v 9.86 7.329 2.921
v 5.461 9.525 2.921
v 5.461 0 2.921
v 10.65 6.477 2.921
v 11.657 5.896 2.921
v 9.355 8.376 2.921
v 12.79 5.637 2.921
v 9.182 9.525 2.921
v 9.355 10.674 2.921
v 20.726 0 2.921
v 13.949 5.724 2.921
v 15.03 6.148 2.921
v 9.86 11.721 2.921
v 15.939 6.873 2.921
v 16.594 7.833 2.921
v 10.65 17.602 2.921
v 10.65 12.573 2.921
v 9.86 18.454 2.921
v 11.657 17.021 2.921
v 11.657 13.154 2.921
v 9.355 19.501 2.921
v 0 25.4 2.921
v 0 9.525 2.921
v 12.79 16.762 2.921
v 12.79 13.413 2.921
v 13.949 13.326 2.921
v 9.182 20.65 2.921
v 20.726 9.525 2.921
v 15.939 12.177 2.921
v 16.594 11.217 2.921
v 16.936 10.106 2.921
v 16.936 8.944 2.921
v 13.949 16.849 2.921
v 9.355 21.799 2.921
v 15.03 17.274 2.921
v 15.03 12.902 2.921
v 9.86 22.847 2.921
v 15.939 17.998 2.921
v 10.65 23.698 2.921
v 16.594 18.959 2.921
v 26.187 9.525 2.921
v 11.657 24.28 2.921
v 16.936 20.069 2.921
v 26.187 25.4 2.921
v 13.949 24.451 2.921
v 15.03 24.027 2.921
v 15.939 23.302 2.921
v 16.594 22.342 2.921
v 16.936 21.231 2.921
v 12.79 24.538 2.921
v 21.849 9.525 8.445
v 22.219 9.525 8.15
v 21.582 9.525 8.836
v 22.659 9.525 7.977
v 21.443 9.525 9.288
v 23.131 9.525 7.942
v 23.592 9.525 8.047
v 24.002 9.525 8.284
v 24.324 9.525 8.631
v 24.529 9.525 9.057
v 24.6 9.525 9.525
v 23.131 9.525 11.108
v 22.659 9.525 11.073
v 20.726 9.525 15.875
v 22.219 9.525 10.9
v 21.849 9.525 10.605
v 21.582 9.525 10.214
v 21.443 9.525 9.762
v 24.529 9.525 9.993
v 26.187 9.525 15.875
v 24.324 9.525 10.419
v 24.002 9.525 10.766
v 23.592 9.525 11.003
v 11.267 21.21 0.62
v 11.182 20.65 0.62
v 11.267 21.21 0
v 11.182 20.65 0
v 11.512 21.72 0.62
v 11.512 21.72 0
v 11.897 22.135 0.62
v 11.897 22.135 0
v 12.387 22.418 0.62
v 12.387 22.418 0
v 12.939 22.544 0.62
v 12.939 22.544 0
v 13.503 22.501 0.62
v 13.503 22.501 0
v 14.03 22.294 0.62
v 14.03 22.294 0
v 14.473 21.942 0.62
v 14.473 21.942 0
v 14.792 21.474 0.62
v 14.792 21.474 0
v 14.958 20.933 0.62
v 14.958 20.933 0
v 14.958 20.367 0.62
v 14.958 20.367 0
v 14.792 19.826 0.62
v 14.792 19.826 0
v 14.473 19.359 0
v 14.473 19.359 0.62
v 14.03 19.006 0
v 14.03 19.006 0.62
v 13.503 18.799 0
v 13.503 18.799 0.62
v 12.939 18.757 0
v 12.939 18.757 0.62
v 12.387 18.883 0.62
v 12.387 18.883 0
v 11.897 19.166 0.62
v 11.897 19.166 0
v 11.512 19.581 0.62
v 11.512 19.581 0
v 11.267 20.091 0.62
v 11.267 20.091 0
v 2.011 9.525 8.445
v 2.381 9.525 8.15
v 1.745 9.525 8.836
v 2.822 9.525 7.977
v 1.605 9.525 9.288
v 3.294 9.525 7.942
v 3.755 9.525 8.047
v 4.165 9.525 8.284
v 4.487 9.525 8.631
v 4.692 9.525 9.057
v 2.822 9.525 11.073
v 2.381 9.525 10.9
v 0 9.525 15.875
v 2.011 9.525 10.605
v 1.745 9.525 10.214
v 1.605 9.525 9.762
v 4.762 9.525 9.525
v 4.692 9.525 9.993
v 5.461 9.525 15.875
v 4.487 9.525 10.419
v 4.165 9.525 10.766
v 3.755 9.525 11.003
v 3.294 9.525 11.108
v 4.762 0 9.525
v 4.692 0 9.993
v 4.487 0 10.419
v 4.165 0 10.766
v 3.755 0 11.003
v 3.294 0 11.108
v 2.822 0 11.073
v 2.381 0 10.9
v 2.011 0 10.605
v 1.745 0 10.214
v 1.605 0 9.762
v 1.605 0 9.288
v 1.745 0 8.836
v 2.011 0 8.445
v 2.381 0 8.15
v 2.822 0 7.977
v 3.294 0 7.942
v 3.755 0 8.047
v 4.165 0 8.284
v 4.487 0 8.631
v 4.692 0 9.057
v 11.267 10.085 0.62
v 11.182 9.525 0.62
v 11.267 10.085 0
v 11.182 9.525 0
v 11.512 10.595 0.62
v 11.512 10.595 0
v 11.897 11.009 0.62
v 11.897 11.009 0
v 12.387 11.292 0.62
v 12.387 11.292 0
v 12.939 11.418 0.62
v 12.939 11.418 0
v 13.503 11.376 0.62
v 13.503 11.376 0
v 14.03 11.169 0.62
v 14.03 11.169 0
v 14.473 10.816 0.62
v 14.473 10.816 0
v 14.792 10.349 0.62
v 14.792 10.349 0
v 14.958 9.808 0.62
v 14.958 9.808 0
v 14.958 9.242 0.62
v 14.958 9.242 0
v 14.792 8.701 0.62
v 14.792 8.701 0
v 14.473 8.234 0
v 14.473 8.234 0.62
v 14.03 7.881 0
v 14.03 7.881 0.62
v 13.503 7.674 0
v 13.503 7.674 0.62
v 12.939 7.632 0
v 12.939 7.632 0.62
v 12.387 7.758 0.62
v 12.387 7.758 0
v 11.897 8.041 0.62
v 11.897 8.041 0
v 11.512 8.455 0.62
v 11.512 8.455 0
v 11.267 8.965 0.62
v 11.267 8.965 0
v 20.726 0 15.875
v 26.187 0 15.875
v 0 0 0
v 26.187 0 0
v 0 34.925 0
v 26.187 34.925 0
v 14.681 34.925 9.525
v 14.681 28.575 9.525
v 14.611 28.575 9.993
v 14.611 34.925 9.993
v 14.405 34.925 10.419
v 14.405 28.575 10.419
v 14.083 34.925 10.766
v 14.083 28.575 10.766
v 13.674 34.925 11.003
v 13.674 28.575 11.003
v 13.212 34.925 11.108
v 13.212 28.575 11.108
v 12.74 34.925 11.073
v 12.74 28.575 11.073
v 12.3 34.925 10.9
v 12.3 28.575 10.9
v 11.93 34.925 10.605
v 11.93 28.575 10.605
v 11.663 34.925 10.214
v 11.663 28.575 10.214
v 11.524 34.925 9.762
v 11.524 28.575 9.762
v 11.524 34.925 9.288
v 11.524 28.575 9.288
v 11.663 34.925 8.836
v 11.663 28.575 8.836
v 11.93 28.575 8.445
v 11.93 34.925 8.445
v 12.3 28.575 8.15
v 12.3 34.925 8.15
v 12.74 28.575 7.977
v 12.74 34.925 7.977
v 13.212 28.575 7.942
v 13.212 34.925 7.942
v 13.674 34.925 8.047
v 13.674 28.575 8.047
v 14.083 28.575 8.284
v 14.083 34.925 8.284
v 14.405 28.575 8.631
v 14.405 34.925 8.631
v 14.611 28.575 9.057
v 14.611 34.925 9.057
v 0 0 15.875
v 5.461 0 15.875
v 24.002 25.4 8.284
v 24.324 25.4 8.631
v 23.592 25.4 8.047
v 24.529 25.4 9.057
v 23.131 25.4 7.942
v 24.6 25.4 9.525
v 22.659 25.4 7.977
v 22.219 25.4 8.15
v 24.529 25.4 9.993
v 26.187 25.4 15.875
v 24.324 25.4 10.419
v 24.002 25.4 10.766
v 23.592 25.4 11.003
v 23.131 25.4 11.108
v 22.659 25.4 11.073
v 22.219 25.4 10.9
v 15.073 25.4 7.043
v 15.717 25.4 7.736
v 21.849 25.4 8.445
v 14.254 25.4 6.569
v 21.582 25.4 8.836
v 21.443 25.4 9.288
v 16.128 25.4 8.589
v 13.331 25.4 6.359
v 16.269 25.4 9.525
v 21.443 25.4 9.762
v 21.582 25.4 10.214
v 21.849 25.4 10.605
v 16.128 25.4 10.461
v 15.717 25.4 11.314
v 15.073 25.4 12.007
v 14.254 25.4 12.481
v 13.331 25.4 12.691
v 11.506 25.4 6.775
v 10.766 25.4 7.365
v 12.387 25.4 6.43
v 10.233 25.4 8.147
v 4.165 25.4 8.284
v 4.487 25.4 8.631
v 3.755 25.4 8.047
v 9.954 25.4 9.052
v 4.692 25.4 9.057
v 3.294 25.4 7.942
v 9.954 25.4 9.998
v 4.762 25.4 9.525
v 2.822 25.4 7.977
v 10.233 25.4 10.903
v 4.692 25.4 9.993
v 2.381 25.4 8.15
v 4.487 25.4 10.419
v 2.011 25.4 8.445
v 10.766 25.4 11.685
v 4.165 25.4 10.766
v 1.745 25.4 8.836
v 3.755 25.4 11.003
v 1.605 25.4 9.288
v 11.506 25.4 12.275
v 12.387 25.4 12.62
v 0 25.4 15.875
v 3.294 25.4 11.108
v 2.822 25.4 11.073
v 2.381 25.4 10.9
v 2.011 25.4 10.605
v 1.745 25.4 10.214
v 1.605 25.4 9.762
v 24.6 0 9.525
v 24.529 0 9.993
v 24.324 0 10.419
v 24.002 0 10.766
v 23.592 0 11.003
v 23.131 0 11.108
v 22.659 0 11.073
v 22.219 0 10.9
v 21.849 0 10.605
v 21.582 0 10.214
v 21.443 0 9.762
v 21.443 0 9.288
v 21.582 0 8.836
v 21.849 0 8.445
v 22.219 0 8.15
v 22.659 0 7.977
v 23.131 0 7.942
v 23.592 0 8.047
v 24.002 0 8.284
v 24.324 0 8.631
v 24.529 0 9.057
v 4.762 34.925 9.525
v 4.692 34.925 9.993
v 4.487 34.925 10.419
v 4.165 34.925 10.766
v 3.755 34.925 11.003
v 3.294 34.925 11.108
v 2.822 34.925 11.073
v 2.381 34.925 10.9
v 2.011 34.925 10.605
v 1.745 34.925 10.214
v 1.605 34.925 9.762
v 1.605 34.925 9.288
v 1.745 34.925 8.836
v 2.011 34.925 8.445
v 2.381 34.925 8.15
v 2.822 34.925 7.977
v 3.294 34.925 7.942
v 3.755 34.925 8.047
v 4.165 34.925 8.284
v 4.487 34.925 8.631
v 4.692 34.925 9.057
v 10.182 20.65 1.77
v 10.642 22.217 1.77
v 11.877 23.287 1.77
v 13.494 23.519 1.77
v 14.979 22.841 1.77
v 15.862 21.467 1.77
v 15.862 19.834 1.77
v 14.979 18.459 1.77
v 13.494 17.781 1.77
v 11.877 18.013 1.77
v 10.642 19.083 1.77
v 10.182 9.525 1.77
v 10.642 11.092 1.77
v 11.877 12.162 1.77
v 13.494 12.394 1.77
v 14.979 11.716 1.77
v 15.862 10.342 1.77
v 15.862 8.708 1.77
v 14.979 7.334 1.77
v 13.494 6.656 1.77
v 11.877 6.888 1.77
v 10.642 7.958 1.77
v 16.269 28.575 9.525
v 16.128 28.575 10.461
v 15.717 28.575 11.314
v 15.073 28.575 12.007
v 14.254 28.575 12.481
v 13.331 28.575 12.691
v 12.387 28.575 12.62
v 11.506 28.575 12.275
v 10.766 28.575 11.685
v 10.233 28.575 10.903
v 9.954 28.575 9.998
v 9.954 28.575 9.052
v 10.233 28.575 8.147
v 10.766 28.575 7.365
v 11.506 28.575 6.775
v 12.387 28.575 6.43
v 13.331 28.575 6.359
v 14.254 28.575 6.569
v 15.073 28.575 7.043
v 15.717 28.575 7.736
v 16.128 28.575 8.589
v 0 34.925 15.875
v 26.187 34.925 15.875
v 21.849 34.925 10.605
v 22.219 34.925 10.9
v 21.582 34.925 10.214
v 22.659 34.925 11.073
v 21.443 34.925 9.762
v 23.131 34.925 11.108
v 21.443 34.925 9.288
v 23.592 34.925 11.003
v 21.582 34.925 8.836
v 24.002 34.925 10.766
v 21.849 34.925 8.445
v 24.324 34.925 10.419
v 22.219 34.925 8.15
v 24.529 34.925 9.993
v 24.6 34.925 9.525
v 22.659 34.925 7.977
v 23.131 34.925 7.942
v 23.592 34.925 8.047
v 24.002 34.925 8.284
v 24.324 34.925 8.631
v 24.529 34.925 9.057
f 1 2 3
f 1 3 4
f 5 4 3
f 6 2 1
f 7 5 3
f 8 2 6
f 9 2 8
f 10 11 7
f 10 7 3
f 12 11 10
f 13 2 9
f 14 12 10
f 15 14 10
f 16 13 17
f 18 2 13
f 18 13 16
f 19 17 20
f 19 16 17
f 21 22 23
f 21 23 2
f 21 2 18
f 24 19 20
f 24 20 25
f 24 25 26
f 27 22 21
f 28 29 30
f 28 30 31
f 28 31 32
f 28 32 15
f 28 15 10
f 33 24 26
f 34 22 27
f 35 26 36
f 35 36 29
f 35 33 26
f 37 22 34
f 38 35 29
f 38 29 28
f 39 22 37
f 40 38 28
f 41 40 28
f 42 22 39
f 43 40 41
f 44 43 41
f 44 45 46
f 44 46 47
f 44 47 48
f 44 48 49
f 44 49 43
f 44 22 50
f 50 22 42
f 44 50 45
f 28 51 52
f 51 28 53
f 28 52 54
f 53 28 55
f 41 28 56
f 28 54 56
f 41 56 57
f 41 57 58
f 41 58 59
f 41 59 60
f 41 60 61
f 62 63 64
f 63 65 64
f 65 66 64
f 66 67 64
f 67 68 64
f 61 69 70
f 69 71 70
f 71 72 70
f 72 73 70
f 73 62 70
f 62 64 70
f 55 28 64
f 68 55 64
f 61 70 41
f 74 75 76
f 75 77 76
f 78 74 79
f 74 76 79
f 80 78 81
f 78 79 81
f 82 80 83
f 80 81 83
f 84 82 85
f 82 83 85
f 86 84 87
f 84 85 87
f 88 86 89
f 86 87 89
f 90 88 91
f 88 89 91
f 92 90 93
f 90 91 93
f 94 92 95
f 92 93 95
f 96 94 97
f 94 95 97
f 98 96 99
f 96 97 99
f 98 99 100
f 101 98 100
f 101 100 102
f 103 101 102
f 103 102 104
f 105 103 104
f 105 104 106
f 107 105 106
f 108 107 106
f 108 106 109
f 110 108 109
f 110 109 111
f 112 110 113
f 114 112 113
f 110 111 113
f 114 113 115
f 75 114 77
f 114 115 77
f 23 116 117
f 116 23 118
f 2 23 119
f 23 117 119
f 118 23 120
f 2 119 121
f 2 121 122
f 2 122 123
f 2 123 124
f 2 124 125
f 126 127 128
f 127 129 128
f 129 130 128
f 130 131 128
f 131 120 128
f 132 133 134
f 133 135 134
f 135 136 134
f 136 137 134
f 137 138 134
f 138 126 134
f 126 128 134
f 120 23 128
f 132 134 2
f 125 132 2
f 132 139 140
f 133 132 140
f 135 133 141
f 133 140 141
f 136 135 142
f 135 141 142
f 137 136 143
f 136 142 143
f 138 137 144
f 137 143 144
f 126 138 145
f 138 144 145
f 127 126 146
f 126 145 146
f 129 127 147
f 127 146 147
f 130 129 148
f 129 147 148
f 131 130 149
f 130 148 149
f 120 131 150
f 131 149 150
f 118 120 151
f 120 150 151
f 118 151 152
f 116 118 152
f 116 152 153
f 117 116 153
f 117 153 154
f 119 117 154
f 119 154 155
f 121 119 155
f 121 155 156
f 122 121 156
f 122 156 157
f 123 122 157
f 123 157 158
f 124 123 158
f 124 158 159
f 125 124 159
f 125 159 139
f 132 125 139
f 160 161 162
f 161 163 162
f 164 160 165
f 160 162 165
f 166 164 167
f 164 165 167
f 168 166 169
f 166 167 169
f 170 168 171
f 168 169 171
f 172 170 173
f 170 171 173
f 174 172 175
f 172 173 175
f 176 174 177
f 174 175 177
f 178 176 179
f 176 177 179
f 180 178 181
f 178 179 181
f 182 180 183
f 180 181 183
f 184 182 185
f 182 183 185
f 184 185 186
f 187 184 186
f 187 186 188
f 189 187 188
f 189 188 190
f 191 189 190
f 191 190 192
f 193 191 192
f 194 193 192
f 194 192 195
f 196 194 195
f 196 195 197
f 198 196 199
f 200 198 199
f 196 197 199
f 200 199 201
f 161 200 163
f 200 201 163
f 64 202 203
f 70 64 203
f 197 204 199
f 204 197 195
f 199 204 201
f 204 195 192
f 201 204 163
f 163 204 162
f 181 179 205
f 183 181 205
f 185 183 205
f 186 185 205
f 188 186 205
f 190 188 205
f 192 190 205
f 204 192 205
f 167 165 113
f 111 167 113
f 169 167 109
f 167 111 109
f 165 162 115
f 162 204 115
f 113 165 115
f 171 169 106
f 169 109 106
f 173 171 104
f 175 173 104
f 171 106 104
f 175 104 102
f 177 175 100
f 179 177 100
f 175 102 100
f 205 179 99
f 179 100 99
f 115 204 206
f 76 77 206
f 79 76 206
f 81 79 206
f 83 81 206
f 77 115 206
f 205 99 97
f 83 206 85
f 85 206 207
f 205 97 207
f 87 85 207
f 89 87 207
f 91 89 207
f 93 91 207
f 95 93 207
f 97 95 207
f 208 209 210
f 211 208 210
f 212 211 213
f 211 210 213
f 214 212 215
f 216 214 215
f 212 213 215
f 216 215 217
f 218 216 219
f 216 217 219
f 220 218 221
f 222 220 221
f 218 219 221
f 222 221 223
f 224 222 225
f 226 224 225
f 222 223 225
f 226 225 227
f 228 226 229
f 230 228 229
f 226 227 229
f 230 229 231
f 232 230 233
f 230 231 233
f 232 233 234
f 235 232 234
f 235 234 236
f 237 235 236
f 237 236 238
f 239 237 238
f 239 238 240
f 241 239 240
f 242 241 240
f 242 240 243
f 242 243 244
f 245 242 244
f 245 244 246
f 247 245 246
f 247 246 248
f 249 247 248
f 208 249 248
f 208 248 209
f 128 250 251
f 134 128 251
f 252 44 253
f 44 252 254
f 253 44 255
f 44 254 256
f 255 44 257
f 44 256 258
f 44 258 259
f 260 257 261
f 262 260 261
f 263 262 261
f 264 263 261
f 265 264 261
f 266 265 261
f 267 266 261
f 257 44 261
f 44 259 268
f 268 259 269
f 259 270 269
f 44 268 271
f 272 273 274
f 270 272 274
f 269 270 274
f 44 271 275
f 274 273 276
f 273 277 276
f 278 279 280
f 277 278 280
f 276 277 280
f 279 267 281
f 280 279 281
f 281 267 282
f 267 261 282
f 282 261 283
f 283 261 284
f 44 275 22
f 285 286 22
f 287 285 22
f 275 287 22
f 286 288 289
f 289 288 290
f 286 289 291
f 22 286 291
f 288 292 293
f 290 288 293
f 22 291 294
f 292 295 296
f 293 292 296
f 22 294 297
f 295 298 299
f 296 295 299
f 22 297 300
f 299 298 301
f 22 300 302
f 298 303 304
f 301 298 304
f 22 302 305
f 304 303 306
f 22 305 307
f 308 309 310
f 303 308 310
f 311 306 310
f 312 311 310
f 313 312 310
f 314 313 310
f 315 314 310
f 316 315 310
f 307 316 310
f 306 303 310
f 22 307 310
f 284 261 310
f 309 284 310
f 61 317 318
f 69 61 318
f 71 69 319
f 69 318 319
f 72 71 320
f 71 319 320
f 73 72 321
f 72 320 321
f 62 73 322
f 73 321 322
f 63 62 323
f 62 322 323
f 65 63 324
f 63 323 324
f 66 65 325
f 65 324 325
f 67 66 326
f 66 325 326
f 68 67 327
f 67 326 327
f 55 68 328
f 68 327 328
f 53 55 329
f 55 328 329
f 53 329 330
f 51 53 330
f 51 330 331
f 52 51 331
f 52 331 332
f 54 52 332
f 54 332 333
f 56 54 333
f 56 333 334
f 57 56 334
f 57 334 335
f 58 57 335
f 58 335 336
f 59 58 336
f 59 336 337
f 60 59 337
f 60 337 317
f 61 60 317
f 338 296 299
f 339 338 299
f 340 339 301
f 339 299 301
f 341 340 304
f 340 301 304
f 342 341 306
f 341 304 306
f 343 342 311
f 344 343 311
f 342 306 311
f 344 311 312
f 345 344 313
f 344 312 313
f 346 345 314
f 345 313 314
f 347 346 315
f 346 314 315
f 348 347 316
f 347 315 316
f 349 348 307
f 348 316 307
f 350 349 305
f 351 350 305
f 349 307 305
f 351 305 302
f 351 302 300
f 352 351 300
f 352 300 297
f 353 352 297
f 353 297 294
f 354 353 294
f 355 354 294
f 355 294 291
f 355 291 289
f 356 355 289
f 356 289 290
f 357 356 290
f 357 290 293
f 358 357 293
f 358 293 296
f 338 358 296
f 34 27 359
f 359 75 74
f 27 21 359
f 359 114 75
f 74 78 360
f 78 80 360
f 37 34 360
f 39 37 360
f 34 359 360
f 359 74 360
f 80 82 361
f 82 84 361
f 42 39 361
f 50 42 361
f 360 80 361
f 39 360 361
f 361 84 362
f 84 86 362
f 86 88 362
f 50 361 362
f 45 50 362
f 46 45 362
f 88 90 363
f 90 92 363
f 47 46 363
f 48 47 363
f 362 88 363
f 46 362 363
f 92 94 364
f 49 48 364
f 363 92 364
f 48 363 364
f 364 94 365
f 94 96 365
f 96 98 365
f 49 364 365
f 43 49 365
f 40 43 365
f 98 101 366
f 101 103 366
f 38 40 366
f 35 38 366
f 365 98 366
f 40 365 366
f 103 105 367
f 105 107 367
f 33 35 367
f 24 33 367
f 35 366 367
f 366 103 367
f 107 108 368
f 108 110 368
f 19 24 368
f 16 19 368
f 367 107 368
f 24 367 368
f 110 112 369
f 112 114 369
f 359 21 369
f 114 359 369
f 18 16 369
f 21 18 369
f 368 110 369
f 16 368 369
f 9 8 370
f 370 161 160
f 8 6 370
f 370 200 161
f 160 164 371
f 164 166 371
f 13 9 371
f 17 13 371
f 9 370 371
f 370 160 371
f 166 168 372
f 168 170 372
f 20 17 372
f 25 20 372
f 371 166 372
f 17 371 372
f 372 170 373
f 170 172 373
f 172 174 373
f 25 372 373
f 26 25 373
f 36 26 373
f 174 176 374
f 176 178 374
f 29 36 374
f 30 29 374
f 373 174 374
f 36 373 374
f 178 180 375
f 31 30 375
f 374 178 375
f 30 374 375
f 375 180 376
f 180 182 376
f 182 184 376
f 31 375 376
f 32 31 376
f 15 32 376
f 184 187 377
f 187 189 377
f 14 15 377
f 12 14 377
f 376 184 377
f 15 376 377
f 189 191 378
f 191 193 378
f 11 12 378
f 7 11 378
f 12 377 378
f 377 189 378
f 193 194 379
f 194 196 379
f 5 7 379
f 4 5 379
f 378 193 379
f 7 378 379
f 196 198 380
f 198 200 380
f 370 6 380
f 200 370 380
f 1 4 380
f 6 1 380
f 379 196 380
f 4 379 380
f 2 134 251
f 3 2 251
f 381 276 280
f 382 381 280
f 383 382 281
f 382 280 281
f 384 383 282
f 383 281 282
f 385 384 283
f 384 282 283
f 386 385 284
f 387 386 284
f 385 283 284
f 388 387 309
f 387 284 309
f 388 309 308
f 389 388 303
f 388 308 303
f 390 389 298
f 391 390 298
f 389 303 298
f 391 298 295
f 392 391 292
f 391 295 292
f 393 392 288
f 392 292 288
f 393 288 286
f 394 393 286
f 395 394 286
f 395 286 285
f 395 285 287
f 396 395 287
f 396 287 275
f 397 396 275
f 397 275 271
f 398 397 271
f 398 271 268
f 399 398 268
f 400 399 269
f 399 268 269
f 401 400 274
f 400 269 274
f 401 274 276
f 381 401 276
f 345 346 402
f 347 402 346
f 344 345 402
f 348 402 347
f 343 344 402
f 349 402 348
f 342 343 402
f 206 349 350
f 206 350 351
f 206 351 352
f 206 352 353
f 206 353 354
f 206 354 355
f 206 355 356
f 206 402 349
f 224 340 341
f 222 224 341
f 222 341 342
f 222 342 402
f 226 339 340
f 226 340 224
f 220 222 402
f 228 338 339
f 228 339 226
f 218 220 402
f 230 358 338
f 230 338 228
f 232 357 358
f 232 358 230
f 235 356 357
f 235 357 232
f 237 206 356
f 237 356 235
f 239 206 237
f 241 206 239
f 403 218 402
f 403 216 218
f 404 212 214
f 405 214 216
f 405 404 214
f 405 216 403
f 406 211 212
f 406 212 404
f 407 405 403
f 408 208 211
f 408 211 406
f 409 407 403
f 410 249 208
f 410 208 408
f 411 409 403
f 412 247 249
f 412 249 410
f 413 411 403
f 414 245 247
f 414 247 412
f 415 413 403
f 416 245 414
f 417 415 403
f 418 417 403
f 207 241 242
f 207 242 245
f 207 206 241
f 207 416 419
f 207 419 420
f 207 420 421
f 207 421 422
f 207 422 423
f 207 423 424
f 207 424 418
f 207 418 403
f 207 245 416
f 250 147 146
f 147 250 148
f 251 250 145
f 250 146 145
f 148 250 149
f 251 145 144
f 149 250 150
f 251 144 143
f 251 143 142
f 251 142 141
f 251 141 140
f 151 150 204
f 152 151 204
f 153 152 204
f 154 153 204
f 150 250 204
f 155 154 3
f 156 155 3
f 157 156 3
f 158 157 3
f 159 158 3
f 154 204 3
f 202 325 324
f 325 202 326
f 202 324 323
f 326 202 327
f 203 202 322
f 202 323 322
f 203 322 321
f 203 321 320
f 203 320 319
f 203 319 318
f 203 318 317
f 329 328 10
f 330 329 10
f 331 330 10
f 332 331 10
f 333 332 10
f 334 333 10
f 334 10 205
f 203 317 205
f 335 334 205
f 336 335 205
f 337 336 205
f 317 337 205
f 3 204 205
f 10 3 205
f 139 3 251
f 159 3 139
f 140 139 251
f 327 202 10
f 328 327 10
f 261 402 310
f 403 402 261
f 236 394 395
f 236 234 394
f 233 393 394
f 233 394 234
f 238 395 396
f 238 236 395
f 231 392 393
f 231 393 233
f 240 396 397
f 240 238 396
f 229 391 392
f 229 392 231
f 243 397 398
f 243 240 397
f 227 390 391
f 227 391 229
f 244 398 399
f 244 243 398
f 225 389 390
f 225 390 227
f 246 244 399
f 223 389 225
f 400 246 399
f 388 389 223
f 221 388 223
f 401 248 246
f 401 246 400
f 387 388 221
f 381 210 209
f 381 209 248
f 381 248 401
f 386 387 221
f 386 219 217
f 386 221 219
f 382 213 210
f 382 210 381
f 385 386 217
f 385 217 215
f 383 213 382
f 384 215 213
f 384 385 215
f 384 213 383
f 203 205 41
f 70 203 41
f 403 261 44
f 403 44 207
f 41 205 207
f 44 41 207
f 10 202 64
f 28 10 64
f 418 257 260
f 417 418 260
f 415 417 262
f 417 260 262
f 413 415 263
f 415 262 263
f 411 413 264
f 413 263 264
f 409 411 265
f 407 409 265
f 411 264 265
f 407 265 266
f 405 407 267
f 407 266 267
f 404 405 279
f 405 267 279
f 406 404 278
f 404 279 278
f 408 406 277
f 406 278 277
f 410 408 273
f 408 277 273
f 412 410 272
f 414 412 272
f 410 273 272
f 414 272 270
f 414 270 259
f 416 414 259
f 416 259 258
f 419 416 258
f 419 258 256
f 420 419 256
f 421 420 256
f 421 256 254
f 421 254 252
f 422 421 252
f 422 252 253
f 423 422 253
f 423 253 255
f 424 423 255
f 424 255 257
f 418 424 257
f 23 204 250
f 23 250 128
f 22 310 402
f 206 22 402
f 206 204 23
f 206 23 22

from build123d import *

# Parameters (mm, degrees)
F0_W           = 26.1874
F0_H           = 34.925
F1_DEPTH       = 15.875
F3_DEPTH       = 12.954
F4_R           = 1.5875
F5_DEPTH       = 34.926
F6_R           = 1.5875
F7_DEPTH       = 9.526
F9_D           = 3.7973
F9_CSINK_D     = 7.7978
F9_CSINK_ANGLE = 82
F10_R          = 3.175
F10_R_2        = 1.5875
F11_DEPTH      = 3.175


with BuildPart() as f1:
    # F0 (on Top) → F1 (new body)
    with BuildSketch(Plane.XY):
        with Locations((13.0937, 17.4625)):
            Rectangle(F0_W, F0_H)
    extrude(amount=F1_DEPTH)

    # F2 (on face) → F3 (cut)
    with BuildSketch(Plane.XY.offset(15.875)):
        Polygon((26.1874, 25.4), (0, 25.4), (0, 9.525), (5.461, 9.525), (5.461, 0), (20.7264, 0), (20.7264, 9.525), (26.1874, 9.525), align=None)
    extrude(amount=-F3_DEPTH, mode=Mode.SUBTRACT)

    # F4 (on face) → F5 (cut, through all)
    with BuildSketch(Plane.XZ):
        with Locations((3.175, 9.525)):
            Circle(F4_R)
        with Locations((23.0124, 9.525)):
            Circle(F4_R)
    extrude(amount=-F5_DEPTH, mode=Mode.SUBTRACT)

    # F6 (on face) → F7 (cut, through all)
    with BuildSketch(Plane.XZ.offset(-25.4)):
        with Locations((13.0937, 9.525)):
            Circle(F6_R)
    extrude(amount=-F7_DEPTH, mode=Mode.SUBTRACT)

    # F9 (through all)
    with Locations(Plane.XY.offset(2.921)):
        with Locations((13.081, 20.6502), (13.081, 9.525)):
            CounterSinkHole(F9_D / 2, F9_CSINK_D / 2, counter_sink_angle=F9_CSINK_ANGLE)

    # F10 (on face) → F11 (cut)
    with BuildSketch(Plane.XZ.offset(-25.4)):
        with Locations((13.0937, 9.525)):
            Circle(F10_R)
        with Locations((13.0937, 9.525)):
            Circle(F10_R_2, mode=Mode.SUBTRACT)
    extrude(amount=-F11_DEPTH, mode=Mode.SUBTRACT)


solid = f1.part
